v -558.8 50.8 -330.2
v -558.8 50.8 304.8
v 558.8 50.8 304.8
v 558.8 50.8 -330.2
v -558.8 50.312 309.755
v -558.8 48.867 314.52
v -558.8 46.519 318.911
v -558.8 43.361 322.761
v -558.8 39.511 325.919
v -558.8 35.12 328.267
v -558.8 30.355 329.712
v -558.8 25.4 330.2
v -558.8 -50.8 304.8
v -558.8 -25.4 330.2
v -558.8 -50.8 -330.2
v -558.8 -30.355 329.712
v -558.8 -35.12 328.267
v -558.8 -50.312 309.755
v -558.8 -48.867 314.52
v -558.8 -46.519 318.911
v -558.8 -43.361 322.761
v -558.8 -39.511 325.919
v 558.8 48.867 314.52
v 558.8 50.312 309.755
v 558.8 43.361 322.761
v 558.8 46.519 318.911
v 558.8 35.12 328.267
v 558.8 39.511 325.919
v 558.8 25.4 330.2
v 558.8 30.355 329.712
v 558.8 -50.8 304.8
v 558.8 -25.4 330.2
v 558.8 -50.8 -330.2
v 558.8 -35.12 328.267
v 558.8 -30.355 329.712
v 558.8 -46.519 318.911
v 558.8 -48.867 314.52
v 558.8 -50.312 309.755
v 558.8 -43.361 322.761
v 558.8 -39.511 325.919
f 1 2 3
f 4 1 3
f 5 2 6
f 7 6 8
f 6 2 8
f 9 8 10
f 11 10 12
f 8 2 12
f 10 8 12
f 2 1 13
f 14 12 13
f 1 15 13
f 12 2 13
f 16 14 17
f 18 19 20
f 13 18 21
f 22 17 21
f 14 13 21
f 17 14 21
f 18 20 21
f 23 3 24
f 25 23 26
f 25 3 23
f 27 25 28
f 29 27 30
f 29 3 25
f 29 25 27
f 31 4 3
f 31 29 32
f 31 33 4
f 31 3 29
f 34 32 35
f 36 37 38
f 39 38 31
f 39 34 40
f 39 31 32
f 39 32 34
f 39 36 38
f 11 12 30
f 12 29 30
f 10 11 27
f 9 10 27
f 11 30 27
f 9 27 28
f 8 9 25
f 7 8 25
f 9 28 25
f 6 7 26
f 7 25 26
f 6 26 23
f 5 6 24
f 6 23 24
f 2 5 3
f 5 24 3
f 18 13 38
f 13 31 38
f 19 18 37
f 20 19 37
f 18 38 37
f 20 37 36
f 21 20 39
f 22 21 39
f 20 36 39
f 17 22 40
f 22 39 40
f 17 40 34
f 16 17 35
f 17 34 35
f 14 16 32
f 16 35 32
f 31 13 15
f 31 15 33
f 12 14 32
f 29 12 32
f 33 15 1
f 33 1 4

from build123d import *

# Parameters (mm, degrees)
F0_W     = 1117.6
F0_H     = 660.4
F1_DEPTH = 50.8
F2_R     = 25.4


with BuildPart() as f1:
    # F0 (on Front) → F1 (new body, symmetric)
    with BuildSketch(Plane.XZ):
        Rectangle(F0_W, F0_H)
    extrude(amount=F1_DEPTH, both=True)

    # F2
    f2_edges = [f1.edges().sort_by_distance(p)[0] for p in [
        (0, -50.8, 330.2),
        (0, 50.8, 330.2),
    ]]
    fillet(f2_edges, radius=F2_R)


solid = f1.part
